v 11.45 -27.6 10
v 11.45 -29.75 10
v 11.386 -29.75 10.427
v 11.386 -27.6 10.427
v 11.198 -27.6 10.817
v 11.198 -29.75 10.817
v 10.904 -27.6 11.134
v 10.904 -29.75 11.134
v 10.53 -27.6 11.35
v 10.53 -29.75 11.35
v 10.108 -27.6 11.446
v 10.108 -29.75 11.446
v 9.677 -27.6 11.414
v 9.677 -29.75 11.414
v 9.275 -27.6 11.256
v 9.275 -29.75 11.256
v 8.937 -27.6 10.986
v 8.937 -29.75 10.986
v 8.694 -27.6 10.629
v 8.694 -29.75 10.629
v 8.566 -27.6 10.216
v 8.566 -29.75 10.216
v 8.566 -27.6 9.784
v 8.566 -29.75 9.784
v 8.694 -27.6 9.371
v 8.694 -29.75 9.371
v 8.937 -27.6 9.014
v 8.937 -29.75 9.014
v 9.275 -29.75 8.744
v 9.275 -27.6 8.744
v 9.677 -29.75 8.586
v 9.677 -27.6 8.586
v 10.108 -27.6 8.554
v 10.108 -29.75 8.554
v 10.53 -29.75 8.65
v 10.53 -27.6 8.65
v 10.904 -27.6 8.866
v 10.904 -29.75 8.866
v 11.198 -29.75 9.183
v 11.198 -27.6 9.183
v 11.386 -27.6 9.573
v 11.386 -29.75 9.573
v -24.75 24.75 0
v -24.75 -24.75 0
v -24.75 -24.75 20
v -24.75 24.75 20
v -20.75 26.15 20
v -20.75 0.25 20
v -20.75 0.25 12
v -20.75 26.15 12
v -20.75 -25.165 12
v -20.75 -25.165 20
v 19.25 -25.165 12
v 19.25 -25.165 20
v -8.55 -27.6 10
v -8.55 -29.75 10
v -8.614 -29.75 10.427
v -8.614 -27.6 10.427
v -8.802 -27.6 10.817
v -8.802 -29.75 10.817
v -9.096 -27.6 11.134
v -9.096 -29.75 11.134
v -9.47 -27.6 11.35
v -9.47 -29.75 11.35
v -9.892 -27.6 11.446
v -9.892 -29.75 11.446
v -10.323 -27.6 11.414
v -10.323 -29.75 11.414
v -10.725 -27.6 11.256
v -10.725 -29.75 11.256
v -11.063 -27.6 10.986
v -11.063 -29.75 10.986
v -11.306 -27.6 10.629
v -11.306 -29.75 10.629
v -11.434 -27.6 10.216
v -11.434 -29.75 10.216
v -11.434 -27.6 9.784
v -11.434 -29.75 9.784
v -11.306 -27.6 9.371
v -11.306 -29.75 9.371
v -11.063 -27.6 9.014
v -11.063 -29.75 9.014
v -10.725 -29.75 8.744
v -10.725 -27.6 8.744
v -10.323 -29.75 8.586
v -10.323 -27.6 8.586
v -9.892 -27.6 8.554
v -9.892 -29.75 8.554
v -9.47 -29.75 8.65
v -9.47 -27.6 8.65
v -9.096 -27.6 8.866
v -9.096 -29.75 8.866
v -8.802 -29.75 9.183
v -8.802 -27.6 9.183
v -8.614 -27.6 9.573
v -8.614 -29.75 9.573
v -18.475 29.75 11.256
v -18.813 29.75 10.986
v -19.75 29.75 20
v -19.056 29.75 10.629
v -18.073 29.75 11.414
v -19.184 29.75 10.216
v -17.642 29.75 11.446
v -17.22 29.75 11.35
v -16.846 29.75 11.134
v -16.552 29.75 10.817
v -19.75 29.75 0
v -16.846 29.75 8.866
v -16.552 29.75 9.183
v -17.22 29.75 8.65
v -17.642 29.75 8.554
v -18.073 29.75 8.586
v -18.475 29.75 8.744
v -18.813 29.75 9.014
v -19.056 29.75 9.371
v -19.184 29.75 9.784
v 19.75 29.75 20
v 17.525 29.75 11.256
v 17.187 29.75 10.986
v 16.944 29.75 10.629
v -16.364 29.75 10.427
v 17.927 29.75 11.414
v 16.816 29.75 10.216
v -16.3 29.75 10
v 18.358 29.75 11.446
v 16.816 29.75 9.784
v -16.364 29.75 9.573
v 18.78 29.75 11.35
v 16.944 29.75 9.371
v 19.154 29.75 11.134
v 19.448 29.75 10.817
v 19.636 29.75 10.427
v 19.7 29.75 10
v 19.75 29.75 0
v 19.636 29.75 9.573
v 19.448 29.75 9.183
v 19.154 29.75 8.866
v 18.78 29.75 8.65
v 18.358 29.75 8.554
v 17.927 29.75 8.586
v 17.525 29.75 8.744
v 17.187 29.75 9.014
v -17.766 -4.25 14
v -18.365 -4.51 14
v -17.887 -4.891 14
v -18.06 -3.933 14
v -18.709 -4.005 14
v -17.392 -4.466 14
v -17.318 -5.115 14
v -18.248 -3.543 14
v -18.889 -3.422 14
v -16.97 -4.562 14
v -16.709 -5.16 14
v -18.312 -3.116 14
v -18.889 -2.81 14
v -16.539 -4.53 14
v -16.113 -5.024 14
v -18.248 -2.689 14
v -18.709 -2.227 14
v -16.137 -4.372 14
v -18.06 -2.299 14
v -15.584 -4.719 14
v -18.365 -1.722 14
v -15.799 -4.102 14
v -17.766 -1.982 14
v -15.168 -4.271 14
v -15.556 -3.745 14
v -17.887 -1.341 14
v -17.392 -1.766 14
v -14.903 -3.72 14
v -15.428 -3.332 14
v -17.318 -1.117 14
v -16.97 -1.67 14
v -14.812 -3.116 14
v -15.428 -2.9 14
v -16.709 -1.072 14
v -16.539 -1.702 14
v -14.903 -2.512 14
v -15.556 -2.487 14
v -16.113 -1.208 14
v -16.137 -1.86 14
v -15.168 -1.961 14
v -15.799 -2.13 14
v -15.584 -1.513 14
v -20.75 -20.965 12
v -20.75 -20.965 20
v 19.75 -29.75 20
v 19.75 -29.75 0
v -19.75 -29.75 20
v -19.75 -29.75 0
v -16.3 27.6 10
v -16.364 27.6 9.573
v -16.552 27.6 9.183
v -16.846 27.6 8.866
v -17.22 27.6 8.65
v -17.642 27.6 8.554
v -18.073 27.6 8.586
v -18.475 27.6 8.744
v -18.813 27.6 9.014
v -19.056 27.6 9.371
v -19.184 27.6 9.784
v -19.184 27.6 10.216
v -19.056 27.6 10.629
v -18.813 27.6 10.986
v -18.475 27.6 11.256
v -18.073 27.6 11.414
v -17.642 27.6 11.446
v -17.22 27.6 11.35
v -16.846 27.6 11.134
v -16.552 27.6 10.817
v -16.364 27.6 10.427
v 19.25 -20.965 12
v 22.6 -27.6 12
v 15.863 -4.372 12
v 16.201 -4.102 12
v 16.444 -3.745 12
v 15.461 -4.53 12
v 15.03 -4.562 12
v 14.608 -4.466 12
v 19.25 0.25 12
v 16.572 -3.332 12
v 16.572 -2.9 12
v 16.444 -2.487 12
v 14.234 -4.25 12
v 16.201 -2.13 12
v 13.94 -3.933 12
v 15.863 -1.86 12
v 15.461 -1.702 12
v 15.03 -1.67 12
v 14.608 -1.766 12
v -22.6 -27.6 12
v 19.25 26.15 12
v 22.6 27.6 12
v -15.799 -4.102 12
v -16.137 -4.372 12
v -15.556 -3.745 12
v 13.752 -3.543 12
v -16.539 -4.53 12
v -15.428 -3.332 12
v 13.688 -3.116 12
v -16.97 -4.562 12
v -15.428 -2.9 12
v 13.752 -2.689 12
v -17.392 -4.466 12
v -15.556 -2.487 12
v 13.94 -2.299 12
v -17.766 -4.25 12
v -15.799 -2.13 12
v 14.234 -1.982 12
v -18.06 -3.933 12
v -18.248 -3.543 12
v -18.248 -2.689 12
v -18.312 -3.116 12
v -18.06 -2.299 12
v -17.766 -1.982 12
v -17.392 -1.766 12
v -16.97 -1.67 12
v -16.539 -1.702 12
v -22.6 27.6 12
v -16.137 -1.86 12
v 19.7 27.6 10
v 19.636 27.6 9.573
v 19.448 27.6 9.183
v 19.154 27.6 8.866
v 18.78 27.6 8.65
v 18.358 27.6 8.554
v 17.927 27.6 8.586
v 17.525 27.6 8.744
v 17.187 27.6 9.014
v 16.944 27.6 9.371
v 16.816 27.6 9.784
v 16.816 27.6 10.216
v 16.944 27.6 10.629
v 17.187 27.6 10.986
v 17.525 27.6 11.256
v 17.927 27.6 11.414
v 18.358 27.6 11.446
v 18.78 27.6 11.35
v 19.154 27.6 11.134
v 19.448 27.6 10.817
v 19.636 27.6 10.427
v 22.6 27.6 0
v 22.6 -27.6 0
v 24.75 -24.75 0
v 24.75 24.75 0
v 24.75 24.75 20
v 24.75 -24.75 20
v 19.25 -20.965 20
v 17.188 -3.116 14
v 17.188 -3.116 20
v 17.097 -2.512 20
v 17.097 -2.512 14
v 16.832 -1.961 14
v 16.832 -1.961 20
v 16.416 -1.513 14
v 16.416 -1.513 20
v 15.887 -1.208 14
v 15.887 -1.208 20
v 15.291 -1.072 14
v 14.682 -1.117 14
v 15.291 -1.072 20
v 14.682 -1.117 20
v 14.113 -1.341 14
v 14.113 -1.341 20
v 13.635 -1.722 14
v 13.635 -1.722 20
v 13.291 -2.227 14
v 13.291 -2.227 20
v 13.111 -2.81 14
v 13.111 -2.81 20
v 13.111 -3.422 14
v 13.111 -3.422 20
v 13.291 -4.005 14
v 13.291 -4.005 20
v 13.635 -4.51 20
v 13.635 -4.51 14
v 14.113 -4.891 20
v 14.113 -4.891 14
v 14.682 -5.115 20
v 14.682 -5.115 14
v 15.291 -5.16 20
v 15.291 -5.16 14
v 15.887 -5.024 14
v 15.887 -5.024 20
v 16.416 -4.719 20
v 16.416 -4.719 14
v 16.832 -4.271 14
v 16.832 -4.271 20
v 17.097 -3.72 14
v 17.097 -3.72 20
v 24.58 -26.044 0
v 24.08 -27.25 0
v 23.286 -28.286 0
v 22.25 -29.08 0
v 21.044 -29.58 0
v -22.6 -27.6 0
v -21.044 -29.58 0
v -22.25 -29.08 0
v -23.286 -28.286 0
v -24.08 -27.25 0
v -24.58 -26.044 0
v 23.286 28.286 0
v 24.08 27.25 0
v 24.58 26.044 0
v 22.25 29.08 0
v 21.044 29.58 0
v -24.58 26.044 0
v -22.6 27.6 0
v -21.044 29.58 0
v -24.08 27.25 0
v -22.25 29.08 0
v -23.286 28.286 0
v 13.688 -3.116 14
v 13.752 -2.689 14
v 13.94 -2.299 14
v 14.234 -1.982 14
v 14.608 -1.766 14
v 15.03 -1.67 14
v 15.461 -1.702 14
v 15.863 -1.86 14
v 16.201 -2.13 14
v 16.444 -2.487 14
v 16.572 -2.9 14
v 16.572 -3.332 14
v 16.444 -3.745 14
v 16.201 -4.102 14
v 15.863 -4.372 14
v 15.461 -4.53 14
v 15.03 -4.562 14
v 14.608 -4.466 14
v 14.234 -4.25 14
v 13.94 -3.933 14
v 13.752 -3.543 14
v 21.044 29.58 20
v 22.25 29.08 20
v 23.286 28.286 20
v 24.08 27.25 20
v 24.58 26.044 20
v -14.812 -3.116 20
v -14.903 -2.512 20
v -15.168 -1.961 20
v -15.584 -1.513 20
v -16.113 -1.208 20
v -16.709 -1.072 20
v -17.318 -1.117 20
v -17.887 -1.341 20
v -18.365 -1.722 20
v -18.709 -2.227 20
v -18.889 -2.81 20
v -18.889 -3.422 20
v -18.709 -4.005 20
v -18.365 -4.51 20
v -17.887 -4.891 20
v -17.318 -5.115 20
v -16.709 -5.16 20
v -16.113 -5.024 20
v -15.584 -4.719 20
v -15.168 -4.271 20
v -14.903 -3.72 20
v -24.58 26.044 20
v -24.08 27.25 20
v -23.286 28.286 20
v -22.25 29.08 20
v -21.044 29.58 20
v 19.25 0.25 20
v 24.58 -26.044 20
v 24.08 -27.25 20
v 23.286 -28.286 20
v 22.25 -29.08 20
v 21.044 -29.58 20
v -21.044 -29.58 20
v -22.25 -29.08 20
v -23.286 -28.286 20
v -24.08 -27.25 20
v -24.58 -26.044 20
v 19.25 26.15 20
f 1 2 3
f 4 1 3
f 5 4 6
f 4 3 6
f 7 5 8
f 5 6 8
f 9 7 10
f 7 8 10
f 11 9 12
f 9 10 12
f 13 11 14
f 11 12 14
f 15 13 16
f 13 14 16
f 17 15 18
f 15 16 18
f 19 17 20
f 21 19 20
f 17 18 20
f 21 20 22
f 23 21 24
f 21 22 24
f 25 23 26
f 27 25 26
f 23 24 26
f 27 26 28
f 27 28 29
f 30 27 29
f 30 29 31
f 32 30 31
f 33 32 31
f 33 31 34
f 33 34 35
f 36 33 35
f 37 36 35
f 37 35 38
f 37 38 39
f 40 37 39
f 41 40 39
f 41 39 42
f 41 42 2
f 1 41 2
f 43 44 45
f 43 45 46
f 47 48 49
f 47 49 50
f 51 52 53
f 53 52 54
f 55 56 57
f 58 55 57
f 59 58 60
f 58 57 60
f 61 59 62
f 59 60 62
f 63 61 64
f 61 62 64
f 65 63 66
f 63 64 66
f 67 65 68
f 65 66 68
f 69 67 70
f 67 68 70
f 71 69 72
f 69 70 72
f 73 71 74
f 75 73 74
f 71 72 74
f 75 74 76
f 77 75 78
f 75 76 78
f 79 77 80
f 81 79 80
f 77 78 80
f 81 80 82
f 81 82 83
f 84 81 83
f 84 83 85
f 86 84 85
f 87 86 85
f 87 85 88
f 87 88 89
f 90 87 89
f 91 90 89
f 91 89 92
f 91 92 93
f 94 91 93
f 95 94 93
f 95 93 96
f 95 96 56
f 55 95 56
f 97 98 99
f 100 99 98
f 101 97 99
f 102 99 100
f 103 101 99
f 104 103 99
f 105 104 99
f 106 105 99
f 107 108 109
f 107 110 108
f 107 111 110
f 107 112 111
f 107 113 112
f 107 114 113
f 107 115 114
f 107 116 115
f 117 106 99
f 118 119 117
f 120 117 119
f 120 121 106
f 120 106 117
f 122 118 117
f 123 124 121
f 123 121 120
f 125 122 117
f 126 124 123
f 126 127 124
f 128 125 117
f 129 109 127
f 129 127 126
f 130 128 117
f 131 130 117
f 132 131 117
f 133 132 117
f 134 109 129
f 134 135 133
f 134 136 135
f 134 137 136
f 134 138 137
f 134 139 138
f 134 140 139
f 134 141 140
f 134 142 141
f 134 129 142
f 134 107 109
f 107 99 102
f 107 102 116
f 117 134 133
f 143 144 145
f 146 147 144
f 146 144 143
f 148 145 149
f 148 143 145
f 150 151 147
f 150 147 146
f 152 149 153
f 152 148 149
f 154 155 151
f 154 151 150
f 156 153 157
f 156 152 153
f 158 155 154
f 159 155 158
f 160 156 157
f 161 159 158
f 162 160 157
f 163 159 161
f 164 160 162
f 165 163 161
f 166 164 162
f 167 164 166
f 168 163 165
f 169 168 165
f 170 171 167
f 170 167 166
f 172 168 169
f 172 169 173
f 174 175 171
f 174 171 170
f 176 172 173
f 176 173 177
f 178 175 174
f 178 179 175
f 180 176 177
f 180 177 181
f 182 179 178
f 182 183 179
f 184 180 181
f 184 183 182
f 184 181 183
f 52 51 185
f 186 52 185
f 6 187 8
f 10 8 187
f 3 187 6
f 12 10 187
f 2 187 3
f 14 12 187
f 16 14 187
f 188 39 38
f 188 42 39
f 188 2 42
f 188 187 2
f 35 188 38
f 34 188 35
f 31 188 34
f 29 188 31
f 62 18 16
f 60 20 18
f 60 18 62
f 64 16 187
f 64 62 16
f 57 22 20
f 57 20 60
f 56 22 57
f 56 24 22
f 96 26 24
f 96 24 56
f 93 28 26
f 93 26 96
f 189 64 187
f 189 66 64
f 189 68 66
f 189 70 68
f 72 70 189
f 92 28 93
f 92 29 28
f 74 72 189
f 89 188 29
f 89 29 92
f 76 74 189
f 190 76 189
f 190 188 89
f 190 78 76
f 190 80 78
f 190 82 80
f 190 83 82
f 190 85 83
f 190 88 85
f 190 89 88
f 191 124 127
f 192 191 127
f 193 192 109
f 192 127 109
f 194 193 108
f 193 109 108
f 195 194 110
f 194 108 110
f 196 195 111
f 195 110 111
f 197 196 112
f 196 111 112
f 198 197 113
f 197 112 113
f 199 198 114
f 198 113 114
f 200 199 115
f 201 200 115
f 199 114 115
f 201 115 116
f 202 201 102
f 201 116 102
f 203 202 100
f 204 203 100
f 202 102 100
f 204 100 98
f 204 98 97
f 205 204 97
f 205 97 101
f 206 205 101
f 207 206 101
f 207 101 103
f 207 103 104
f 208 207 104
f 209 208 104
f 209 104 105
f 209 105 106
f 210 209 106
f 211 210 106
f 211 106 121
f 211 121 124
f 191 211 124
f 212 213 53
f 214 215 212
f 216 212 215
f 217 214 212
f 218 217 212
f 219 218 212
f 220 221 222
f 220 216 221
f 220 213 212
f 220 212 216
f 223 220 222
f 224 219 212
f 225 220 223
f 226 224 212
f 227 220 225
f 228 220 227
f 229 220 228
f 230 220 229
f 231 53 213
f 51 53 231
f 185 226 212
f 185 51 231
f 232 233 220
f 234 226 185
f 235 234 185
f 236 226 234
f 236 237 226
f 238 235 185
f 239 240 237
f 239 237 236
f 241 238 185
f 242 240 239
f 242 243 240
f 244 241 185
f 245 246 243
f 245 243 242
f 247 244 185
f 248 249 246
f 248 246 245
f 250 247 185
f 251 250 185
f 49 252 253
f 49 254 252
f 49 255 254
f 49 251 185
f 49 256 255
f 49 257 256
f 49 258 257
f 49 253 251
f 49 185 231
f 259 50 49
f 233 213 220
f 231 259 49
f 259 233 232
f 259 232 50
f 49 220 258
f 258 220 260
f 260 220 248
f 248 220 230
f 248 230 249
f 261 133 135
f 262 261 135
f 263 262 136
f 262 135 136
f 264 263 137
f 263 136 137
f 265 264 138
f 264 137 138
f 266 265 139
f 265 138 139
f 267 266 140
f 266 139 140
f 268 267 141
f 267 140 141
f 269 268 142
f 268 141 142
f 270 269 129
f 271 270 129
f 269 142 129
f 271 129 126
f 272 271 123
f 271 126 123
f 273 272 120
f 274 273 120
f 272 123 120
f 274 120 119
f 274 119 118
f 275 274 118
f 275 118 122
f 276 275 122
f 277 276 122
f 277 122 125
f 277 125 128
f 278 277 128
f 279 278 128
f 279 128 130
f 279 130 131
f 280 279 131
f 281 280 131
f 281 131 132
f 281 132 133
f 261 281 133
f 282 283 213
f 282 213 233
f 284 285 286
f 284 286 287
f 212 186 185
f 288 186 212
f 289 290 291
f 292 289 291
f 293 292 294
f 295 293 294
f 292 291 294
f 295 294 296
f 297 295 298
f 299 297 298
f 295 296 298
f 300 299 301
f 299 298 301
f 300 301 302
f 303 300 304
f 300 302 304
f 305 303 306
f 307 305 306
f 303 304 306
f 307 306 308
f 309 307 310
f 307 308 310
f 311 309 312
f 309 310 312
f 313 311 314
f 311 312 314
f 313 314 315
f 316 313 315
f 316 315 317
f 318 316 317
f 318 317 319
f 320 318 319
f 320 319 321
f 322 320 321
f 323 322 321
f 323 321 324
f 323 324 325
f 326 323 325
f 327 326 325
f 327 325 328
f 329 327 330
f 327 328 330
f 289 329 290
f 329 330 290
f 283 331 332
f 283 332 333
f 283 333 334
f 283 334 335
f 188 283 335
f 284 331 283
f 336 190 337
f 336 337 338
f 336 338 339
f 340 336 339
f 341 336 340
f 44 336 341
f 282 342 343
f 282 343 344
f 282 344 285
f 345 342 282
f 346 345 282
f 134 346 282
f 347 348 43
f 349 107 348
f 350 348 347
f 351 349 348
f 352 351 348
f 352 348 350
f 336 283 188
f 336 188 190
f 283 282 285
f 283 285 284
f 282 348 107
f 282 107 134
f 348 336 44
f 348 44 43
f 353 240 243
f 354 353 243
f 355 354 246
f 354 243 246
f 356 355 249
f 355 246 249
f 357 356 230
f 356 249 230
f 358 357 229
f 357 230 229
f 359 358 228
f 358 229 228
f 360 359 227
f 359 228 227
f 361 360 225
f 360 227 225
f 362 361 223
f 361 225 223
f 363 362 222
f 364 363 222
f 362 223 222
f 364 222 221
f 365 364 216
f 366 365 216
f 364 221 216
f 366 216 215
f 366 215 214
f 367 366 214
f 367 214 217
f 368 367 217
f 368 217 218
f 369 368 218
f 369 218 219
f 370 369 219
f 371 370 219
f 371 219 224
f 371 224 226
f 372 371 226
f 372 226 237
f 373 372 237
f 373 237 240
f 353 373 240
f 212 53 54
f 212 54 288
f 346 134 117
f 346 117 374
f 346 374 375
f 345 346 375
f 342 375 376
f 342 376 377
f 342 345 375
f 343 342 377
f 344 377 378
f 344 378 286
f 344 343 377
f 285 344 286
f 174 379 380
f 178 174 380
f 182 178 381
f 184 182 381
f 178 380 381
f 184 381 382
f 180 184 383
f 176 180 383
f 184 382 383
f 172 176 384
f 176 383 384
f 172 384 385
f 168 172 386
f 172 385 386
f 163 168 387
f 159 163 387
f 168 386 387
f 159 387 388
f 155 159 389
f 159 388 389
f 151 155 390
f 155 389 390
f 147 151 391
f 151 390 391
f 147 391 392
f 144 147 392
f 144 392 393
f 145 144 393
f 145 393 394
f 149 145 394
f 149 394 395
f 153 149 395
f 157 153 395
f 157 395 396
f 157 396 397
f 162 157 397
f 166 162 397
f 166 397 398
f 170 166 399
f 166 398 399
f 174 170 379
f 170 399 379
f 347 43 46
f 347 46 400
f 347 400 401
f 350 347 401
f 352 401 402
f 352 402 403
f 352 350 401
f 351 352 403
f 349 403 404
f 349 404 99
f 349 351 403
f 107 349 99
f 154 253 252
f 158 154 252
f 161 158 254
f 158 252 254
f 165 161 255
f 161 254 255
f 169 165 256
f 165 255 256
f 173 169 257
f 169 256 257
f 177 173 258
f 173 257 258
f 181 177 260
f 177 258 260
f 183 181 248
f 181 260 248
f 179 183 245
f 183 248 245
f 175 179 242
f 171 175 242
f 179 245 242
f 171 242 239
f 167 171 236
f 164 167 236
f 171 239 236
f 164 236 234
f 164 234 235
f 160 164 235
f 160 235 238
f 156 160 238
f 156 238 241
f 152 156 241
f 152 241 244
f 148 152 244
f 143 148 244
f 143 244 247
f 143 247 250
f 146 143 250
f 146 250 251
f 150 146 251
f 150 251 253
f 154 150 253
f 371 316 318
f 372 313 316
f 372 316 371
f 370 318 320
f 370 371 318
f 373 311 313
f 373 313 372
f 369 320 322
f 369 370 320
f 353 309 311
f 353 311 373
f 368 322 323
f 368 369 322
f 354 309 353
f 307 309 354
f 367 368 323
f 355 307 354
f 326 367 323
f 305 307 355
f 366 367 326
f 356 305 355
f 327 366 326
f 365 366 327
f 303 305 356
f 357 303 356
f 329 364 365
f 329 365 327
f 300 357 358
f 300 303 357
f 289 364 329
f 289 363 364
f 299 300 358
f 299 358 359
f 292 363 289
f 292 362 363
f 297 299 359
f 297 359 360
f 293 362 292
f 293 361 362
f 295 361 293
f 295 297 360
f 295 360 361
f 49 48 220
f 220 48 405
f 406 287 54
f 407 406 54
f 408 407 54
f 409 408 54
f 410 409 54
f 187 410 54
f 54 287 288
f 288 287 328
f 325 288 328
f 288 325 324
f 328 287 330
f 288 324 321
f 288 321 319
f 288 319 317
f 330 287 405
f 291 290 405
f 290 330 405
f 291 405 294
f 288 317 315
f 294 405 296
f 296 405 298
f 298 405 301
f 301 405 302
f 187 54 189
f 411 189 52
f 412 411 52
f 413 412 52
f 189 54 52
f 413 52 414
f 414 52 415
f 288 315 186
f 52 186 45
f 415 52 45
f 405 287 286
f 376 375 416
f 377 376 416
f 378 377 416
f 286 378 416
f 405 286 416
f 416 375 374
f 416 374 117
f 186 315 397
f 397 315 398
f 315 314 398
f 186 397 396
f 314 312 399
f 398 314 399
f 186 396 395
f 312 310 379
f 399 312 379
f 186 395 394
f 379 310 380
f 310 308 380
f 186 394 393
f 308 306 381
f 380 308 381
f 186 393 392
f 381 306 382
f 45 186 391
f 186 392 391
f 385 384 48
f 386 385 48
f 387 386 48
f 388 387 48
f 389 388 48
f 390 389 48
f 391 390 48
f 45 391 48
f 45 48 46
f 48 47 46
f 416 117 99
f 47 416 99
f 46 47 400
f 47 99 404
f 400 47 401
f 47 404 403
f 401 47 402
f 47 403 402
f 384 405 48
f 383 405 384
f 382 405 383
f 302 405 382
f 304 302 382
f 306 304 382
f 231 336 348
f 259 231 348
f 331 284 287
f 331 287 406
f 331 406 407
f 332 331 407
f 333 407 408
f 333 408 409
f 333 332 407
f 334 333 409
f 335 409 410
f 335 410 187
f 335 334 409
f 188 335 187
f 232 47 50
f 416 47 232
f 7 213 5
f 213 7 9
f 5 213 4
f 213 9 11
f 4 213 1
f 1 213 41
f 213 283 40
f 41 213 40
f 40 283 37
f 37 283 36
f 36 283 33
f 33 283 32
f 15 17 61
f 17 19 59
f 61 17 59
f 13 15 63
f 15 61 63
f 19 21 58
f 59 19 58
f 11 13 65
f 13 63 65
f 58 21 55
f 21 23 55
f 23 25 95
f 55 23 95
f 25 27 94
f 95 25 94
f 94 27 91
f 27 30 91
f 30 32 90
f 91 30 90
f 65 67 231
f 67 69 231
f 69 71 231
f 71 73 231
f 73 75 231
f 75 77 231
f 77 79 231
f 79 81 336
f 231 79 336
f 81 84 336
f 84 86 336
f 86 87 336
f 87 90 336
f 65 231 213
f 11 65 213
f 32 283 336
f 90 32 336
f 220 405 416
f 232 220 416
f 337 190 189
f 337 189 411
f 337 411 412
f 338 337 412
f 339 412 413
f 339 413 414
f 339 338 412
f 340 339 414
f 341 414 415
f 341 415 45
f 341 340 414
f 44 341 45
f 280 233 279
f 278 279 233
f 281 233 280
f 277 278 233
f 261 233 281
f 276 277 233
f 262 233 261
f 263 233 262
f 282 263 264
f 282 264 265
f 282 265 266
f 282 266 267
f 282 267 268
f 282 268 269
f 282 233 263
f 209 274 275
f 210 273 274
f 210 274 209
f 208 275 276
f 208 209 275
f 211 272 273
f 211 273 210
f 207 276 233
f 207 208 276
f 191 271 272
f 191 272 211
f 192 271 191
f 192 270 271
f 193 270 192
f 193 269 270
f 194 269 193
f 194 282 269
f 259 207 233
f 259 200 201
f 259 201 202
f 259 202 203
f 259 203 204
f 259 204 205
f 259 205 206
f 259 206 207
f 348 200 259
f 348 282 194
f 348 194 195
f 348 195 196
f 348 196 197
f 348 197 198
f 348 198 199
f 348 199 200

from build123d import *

# Parameters (mm, degrees)
EXTRUDE_1_DEPTH     = 20
SKETCH_2_W          = 45.2
SKETCH_2_H          = 55.2
CUT_EXTRUDE_1_DEPTH = 12
SKETCH_4_W          = 40
SKETCH_4_H          = 25.9
SKETCH_4_H_2        = 4.2
CUT_EXTRUDE_2_DEPTH = 21
SKETCH_6_R          = 1.45
CUT_EXTRUDE_4_DEPTH = 9
SKETCH_7_R          = 2.05
CUT_EXTRUDE_5_DEPTH = 6
SKETCH_8_R          = 1.45
CUT_EXTRUDE_6_DEPTH = 6
SKETCH_9_R          = 1.45
CUT_EXTRUDE_7_DEPTH = 6


with BuildPart() as part:
    # 草图1 → 凸台-拉伸1 (new body)
    with BuildSketch(Plane.XY):
        with BuildLine():
            Line((-19.75, 29.75), (19.75, 29.75))
            ThreePointArc((19.75, 29.75), (23.285533906, 28.285533906), (24.75, 24.75))
            Line((24.75, 24.75), (24.75, -24.75))
            ThreePointArc((24.75, -24.75), (23.285533906, -28.285533906), (19.75, -29.75))
            Line((19.75, -29.75), (-19.75, -29.75))
            ThreePointArc((-19.75, -29.75), (-23.285533906, -28.285533906), (-24.75, -24.75))
            Line((-24.75, -24.75), (-24.75, 24.75))
            ThreePointArc((-24.75, 24.75), (-23.285533906, 28.285533906), (-19.75, 29.75))
        make_face()
    extrude(amount=EXTRUDE_1_DEPTH)

    # 草图2 → 切除-拉伸1 (cut)
    with BuildSketch(Plane(origin=(0, 0, 0), x_dir=(-1, 0, 0), z_dir=(0, 0, -1))):
        Rectangle(SKETCH_2_W, SKETCH_2_H)
    extrude(amount=-CUT_EXTRUDE_1_DEPTH, mode=Mode.SUBTRACT)

    # 草图4 → 切除-拉伸2 (cut, through all)
    with BuildSketch(Plane.XY.offset(20)):
        with Locations((-0.75, 13.2)):
            Rectangle(SKETCH_4_W, SKETCH_4_H)
        with Locations((-0.75, -23.065049662)):
            Rectangle(SKETCH_4_W, SKETCH_4_H_2)
    extrude(amount=-CUT_EXTRUDE_2_DEPTH, mode=Mode.SUBTRACT)

    # 草图6 → 切除-拉伸4 (cut, through all)
    with BuildSketch(Plane(origin=(0, 0, 12), x_dir=(-1, 0, 0), z_dir=(0, 0, -1))):
        with Locations((16.862, -3.116)):
            Circle(SKETCH_6_R)
        with Locations((-15.138, -3.116)):
            Circle(SKETCH_6_R)
    extrude(amount=-CUT_EXTRUDE_4_DEPTH, mode=Mode.SUBTRACT)

    # 草图7 → 切除-拉伸5 (cut)
    with BuildSketch(Plane.XY.offset(20)):
        with Locations((-16.862, -3.116)):
            Circle(SKETCH_7_R)
        with Locations((15.138, -3.116)):
            Circle(SKETCH_7_R)
    extrude(amount=-CUT_EXTRUDE_5_DEPTH, mode=Mode.SUBTRACT)

    # 草图8 → 切除-拉伸6 (cut)
    with BuildSketch(Plane(origin=(0, 29.75, 0), x_dir=(1, 0, 0), z_dir=(0, 1, 0))):
        with Locations((-17.75, -10)):
            Circle(SKETCH_8_R)
        with Locations((18.25, -10)):
            Circle(SKETCH_8_R)
    extrude(amount=-CUT_EXTRUDE_6_DEPTH, mode=Mode.SUBTRACT)

    # 草图9 → 切除-拉伸7 (cut)
    with BuildSketch(Plane.XZ.offset(29.75)):
        with Locations((-10, 10)):
            Circle(SKETCH_9_R)
        with Locations((10, 10)):
            Circle(SKETCH_9_R)
    extrude(amount=-CUT_EXTRUDE_7_DEPTH, mode=Mode.SUBTRACT)


solid = part.part
